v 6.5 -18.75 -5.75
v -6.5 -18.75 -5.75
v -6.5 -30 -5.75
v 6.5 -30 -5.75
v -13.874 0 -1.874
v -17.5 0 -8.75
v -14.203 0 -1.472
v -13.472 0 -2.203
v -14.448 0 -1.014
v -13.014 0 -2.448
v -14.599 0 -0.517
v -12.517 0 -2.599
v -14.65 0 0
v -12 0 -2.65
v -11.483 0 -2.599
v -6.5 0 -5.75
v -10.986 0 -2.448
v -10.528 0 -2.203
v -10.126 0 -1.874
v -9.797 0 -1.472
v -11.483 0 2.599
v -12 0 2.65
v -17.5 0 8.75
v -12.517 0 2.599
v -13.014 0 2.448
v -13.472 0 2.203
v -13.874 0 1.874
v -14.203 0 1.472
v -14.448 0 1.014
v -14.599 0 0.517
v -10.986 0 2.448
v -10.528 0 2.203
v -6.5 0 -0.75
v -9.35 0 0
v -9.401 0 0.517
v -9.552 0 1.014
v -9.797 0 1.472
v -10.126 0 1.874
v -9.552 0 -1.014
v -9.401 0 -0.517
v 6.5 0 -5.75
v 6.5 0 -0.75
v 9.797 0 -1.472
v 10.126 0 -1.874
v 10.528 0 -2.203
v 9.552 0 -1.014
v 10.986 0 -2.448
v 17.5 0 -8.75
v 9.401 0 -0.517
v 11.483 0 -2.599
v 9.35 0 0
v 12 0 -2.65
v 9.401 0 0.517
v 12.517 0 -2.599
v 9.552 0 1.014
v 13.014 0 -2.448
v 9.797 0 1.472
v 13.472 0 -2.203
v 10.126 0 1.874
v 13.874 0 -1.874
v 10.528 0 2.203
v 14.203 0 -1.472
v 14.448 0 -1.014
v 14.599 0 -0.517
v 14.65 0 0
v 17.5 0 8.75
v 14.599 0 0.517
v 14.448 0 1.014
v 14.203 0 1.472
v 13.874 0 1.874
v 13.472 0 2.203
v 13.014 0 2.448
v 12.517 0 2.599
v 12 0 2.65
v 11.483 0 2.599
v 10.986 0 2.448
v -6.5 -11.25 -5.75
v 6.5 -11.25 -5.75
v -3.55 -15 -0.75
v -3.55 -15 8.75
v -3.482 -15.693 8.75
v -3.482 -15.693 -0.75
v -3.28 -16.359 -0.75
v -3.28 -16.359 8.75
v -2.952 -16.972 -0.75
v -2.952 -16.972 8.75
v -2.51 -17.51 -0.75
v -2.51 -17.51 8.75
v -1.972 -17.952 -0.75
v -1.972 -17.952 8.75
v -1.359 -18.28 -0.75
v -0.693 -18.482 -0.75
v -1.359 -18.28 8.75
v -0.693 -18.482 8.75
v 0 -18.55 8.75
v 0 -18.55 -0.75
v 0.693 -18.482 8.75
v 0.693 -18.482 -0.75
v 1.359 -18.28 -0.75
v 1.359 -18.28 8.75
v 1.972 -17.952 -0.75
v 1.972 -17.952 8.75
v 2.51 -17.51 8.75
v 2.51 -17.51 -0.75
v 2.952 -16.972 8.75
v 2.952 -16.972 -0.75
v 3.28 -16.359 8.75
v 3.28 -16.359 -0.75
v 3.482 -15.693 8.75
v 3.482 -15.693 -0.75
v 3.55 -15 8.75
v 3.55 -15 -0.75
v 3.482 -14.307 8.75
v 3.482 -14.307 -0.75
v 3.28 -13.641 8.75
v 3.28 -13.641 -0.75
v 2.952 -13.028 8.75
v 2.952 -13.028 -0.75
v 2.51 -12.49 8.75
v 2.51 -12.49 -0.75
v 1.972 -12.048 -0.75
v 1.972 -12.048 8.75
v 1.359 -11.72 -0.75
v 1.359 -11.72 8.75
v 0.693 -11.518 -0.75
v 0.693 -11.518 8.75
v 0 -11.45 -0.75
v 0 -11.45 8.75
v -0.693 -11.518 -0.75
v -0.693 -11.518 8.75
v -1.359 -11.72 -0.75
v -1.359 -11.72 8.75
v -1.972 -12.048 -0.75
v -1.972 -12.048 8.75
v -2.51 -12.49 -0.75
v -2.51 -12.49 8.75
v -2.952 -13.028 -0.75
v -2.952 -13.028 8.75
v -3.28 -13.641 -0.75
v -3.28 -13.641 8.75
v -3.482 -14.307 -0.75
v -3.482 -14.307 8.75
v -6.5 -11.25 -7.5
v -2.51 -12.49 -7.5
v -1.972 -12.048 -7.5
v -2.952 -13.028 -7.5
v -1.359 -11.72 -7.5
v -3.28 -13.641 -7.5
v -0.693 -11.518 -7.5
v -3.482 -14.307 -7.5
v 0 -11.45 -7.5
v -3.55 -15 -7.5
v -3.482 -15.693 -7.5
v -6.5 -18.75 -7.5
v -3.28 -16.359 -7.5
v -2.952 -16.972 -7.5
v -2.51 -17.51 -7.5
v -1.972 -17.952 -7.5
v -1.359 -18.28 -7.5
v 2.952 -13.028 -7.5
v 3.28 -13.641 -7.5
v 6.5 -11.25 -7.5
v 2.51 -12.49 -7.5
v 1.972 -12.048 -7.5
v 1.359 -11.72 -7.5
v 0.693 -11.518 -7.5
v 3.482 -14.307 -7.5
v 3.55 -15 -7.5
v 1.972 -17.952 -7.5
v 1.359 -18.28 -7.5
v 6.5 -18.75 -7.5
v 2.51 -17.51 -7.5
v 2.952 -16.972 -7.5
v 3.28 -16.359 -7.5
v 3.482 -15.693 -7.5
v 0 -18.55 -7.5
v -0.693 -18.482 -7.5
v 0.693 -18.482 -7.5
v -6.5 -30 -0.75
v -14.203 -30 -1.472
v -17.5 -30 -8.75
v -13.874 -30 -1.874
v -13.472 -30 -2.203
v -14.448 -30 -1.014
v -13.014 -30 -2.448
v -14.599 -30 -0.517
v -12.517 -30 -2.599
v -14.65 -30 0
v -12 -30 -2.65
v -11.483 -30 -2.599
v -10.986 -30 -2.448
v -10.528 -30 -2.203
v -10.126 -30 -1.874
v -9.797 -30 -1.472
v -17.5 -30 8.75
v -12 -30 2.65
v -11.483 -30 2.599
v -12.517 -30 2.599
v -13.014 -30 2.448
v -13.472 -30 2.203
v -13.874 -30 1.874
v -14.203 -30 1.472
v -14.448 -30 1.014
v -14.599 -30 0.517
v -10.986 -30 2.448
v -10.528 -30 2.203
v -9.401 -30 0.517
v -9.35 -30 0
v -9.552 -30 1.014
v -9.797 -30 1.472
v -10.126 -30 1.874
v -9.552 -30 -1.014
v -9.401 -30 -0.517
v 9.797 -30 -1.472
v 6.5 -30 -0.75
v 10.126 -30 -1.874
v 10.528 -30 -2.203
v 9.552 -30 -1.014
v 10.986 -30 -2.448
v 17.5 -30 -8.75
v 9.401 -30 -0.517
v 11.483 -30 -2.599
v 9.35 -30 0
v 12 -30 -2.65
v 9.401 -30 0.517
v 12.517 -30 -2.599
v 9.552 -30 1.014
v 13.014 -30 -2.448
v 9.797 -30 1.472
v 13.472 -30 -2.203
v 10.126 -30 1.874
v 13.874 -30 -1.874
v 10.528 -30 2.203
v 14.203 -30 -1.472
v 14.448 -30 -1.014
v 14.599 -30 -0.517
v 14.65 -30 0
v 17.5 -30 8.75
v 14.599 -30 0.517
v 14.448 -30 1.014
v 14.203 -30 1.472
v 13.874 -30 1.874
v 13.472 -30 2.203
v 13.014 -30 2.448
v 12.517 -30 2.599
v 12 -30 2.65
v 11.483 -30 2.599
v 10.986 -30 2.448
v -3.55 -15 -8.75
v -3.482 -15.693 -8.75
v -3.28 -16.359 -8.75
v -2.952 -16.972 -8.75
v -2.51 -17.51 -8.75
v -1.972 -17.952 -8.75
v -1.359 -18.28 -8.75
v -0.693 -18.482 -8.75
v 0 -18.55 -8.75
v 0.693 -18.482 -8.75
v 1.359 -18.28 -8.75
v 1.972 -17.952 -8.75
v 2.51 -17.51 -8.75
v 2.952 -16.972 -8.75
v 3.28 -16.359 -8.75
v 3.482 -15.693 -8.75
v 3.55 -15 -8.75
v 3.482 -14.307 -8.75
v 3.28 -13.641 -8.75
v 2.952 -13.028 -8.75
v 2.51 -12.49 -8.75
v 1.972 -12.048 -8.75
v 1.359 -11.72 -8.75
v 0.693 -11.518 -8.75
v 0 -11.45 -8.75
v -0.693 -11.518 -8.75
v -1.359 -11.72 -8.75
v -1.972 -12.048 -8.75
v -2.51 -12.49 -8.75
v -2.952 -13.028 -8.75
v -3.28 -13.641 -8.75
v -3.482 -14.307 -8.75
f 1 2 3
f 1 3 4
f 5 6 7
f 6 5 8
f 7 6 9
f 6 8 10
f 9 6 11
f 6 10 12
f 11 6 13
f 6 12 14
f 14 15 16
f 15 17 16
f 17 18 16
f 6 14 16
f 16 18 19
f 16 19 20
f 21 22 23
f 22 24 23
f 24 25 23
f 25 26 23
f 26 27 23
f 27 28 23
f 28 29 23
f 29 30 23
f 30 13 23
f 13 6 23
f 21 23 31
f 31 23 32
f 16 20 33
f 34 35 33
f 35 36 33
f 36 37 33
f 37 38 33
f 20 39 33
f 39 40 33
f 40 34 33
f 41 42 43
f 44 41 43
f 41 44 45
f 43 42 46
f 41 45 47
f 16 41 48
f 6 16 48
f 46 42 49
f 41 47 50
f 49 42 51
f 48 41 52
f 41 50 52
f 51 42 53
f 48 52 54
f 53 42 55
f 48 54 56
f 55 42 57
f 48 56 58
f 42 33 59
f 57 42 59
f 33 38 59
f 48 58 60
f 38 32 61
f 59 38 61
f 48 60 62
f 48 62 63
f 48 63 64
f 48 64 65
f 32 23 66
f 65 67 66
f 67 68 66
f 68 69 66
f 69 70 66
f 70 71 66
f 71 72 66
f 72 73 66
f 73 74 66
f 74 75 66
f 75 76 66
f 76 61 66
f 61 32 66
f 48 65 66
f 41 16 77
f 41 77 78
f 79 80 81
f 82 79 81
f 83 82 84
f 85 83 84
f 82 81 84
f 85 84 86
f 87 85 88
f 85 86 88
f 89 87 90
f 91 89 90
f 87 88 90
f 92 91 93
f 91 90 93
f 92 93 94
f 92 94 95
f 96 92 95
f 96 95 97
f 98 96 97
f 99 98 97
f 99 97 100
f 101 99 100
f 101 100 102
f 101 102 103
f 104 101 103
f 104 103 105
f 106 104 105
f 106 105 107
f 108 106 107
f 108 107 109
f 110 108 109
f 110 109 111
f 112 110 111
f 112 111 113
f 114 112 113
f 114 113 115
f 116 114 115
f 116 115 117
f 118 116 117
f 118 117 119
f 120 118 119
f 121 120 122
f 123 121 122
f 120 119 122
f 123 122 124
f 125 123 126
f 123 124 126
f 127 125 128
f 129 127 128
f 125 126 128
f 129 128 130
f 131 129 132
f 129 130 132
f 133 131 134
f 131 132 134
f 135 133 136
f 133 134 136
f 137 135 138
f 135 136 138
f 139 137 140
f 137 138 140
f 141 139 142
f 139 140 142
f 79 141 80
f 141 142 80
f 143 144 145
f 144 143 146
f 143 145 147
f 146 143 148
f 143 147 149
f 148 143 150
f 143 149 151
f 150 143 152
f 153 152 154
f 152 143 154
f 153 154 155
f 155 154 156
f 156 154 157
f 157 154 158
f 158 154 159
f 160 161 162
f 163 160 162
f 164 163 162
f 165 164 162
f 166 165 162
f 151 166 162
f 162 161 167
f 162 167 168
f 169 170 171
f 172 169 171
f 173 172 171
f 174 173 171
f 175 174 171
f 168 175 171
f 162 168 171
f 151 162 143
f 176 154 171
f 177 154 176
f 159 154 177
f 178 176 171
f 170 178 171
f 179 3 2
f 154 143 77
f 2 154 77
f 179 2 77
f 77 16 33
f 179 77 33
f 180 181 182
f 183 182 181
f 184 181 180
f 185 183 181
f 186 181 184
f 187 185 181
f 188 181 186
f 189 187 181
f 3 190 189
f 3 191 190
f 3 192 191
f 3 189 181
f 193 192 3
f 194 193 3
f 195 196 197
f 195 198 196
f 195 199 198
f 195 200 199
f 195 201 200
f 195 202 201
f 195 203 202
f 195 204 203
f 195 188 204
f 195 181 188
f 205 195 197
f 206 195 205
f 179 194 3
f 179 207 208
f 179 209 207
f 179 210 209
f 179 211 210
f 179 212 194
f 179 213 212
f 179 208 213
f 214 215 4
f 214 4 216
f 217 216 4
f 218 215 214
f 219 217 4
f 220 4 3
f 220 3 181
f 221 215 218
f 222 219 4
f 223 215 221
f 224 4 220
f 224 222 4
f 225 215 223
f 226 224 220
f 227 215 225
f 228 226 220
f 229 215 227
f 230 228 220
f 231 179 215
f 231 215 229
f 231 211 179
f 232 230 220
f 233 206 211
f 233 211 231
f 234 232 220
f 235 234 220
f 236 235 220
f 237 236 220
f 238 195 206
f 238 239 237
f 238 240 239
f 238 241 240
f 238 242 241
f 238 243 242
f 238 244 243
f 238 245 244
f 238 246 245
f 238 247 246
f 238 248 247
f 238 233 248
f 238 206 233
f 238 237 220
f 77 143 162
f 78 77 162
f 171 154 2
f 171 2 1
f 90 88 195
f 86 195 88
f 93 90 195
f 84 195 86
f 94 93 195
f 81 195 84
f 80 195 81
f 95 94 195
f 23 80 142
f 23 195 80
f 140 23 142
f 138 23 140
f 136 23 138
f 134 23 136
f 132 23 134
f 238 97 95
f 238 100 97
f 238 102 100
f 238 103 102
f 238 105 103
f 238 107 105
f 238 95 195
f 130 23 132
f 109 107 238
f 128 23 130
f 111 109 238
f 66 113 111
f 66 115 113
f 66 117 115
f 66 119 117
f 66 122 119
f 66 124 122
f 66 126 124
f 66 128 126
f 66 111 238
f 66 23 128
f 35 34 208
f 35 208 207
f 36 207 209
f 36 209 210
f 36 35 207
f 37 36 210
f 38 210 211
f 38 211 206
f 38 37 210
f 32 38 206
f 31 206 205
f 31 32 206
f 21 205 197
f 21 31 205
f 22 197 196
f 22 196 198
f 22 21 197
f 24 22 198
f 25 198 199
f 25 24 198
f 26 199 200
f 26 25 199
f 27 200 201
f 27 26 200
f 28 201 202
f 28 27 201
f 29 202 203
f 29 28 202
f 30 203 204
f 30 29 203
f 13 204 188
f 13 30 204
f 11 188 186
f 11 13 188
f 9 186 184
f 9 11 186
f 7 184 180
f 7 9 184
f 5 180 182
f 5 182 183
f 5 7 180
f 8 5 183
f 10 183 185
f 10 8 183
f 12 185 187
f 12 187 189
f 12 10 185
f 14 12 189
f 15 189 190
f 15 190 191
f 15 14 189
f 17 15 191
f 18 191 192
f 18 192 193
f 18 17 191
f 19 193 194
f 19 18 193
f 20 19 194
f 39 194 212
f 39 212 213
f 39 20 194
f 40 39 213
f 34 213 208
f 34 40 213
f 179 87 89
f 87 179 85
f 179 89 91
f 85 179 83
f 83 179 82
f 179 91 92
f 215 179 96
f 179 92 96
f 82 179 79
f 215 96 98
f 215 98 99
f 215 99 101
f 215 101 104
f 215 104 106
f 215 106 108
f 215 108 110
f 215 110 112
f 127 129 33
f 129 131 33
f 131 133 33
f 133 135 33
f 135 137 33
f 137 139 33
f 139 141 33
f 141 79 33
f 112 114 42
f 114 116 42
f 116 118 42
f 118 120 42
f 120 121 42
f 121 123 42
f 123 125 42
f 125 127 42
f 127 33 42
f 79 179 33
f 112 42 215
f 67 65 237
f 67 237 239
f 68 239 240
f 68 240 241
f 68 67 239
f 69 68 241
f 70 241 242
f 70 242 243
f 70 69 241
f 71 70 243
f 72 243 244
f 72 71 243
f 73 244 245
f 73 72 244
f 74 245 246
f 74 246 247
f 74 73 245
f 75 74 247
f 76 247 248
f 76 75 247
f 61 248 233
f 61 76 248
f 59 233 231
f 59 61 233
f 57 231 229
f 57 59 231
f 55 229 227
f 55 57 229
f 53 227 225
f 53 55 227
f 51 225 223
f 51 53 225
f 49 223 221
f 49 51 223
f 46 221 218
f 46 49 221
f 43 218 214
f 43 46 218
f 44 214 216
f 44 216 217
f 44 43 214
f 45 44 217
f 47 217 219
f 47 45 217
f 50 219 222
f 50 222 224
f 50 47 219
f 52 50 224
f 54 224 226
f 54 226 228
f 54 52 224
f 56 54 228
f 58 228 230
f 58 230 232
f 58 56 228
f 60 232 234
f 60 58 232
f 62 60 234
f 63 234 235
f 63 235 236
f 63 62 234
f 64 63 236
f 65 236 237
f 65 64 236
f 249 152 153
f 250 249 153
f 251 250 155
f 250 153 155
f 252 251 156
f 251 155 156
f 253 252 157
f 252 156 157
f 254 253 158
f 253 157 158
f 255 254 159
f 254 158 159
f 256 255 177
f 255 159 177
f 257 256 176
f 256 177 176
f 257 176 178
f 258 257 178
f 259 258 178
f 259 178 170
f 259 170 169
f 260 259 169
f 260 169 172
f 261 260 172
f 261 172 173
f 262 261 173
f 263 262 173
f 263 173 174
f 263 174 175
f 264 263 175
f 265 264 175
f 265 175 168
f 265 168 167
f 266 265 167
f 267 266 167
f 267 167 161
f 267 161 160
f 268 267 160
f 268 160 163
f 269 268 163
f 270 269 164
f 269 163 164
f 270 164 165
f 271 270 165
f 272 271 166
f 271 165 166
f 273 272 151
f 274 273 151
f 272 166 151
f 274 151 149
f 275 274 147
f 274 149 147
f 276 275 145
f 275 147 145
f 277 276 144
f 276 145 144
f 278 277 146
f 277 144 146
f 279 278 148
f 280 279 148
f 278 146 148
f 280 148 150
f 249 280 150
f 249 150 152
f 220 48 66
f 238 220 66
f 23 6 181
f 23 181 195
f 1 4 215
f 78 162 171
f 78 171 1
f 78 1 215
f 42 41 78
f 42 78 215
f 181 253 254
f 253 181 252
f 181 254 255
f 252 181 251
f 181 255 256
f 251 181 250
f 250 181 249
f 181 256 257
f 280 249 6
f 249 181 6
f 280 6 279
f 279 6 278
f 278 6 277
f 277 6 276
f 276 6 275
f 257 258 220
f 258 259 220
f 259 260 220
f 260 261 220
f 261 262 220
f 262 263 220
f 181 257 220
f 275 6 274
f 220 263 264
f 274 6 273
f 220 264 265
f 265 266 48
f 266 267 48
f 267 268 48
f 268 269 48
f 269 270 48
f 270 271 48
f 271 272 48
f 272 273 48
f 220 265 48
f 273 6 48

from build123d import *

# Parameters (mm, degrees)
SKETCH_W        = 35
SKETCH_H        = 17.5
SKETCH_R        = 2.65
SKETCH_W_2      = 13
SKETCH_H_2      = 5
PAD_DEPTH       = 30
SKETCH001_R     = 3.55
POCKET_DEPTH    = 17.501
SKETCH002_W     = 13
SKETCH002_H     = 7.5
POCKET001_DEPTH = 5


with BuildPart() as part:
    # Sketch → Pad (new body)
    with BuildSketch(Plane.XZ):
        Rectangle(SKETCH_W, SKETCH_H)
        with Locations((-12, 0)):
            Circle(SKETCH_R, mode=Mode.SUBTRACT)
        with Locations((12, 0)):
            Circle(SKETCH_R, mode=Mode.SUBTRACT)
        with Locations((0, -3.25)):
            Rectangle(SKETCH_W_2, SKETCH_H_2, mode=Mode.SUBTRACT)
    extrude(amount=PAD_DEPTH)

    # Sketch001 (on DatumPlane) → Pocket (cut, through all)
    with BuildSketch(Plane(origin=(0, 0, 8.75), x_dir=(-1, 0, 0), z_dir=(0, 0, 1))):
        with Locations((0, 15)):
            Circle(SKETCH001_R)
    extrude(amount=-POCKET_DEPTH, mode=Mode.SUBTRACT)

    # Sketch002 → Pocket001 (cut)
    with BuildSketch(Plane(origin=(0, 0, -7.5), x_dir=(1, 0, 0), z_dir=(0, 0, -1))):
        with Locations((0, 15)):
            Rectangle(SKETCH002_W, SKETCH002_H)
    extrude(amount=-POCKET001_DEPTH, mode=Mode.SUBTRACT)


solid = part.part
